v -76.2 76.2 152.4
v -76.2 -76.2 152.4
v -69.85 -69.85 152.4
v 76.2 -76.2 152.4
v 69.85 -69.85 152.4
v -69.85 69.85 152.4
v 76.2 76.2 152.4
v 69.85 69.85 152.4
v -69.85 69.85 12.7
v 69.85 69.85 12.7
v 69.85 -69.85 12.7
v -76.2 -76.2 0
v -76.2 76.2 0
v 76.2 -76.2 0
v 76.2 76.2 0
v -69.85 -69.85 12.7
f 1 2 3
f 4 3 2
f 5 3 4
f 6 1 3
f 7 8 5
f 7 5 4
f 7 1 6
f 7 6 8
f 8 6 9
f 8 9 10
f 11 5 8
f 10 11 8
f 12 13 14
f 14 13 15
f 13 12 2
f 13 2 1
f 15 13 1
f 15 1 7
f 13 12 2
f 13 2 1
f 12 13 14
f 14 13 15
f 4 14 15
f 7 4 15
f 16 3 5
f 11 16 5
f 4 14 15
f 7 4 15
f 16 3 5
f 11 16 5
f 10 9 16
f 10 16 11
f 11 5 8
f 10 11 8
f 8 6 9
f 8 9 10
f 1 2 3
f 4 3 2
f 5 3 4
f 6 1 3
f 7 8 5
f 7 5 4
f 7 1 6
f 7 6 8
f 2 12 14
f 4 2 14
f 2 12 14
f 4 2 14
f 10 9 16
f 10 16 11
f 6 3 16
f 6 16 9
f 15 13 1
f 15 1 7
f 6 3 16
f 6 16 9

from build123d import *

# Parameters (mm, degrees)
F0_W     = 152.4
F0_H     = 152.4
F2_DEPTH = 152.4
F1_W     = 152.4
F1_H     = 152.4
F3_W     = 139.7
F3_H     = 139.7
F4_DEPTH = 139.7


with BuildPart() as f2:
    # F0 (on Top) → F2 (new body)
    with BuildSketch(Plane.XY):
        Rectangle(F0_W, F0_H)
    extrude(amount=F2_DEPTH)


with BuildPart() as f2b:
    # F1 (on face) → F2, piece 2 (new body)
    with BuildSketch(Plane.XY):
        Rectangle(F1_W, F1_H)
    extrude(amount=F2_DEPTH)


with BuildPart() as f4_tool:
    # F3 (on face) → F4 (new body)
    with BuildSketch(Plane.XY.offset(152.4)):
        Rectangle(F3_W, F3_H)
    extrude(amount=-F4_DEPTH)


with BuildPart() as f2_1:
    add(f2.part)

    # F4: cut by f4_tool
    add(f4_tool.part, mode=Mode.SUBTRACT)


with BuildPart() as f2b_1:
    add(f2b.part)

    # F4: cut by f4_tool
    add(f4_tool.part, mode=Mode.SUBTRACT)


solid = Compound([f2_1.part, f2b_1.part])
